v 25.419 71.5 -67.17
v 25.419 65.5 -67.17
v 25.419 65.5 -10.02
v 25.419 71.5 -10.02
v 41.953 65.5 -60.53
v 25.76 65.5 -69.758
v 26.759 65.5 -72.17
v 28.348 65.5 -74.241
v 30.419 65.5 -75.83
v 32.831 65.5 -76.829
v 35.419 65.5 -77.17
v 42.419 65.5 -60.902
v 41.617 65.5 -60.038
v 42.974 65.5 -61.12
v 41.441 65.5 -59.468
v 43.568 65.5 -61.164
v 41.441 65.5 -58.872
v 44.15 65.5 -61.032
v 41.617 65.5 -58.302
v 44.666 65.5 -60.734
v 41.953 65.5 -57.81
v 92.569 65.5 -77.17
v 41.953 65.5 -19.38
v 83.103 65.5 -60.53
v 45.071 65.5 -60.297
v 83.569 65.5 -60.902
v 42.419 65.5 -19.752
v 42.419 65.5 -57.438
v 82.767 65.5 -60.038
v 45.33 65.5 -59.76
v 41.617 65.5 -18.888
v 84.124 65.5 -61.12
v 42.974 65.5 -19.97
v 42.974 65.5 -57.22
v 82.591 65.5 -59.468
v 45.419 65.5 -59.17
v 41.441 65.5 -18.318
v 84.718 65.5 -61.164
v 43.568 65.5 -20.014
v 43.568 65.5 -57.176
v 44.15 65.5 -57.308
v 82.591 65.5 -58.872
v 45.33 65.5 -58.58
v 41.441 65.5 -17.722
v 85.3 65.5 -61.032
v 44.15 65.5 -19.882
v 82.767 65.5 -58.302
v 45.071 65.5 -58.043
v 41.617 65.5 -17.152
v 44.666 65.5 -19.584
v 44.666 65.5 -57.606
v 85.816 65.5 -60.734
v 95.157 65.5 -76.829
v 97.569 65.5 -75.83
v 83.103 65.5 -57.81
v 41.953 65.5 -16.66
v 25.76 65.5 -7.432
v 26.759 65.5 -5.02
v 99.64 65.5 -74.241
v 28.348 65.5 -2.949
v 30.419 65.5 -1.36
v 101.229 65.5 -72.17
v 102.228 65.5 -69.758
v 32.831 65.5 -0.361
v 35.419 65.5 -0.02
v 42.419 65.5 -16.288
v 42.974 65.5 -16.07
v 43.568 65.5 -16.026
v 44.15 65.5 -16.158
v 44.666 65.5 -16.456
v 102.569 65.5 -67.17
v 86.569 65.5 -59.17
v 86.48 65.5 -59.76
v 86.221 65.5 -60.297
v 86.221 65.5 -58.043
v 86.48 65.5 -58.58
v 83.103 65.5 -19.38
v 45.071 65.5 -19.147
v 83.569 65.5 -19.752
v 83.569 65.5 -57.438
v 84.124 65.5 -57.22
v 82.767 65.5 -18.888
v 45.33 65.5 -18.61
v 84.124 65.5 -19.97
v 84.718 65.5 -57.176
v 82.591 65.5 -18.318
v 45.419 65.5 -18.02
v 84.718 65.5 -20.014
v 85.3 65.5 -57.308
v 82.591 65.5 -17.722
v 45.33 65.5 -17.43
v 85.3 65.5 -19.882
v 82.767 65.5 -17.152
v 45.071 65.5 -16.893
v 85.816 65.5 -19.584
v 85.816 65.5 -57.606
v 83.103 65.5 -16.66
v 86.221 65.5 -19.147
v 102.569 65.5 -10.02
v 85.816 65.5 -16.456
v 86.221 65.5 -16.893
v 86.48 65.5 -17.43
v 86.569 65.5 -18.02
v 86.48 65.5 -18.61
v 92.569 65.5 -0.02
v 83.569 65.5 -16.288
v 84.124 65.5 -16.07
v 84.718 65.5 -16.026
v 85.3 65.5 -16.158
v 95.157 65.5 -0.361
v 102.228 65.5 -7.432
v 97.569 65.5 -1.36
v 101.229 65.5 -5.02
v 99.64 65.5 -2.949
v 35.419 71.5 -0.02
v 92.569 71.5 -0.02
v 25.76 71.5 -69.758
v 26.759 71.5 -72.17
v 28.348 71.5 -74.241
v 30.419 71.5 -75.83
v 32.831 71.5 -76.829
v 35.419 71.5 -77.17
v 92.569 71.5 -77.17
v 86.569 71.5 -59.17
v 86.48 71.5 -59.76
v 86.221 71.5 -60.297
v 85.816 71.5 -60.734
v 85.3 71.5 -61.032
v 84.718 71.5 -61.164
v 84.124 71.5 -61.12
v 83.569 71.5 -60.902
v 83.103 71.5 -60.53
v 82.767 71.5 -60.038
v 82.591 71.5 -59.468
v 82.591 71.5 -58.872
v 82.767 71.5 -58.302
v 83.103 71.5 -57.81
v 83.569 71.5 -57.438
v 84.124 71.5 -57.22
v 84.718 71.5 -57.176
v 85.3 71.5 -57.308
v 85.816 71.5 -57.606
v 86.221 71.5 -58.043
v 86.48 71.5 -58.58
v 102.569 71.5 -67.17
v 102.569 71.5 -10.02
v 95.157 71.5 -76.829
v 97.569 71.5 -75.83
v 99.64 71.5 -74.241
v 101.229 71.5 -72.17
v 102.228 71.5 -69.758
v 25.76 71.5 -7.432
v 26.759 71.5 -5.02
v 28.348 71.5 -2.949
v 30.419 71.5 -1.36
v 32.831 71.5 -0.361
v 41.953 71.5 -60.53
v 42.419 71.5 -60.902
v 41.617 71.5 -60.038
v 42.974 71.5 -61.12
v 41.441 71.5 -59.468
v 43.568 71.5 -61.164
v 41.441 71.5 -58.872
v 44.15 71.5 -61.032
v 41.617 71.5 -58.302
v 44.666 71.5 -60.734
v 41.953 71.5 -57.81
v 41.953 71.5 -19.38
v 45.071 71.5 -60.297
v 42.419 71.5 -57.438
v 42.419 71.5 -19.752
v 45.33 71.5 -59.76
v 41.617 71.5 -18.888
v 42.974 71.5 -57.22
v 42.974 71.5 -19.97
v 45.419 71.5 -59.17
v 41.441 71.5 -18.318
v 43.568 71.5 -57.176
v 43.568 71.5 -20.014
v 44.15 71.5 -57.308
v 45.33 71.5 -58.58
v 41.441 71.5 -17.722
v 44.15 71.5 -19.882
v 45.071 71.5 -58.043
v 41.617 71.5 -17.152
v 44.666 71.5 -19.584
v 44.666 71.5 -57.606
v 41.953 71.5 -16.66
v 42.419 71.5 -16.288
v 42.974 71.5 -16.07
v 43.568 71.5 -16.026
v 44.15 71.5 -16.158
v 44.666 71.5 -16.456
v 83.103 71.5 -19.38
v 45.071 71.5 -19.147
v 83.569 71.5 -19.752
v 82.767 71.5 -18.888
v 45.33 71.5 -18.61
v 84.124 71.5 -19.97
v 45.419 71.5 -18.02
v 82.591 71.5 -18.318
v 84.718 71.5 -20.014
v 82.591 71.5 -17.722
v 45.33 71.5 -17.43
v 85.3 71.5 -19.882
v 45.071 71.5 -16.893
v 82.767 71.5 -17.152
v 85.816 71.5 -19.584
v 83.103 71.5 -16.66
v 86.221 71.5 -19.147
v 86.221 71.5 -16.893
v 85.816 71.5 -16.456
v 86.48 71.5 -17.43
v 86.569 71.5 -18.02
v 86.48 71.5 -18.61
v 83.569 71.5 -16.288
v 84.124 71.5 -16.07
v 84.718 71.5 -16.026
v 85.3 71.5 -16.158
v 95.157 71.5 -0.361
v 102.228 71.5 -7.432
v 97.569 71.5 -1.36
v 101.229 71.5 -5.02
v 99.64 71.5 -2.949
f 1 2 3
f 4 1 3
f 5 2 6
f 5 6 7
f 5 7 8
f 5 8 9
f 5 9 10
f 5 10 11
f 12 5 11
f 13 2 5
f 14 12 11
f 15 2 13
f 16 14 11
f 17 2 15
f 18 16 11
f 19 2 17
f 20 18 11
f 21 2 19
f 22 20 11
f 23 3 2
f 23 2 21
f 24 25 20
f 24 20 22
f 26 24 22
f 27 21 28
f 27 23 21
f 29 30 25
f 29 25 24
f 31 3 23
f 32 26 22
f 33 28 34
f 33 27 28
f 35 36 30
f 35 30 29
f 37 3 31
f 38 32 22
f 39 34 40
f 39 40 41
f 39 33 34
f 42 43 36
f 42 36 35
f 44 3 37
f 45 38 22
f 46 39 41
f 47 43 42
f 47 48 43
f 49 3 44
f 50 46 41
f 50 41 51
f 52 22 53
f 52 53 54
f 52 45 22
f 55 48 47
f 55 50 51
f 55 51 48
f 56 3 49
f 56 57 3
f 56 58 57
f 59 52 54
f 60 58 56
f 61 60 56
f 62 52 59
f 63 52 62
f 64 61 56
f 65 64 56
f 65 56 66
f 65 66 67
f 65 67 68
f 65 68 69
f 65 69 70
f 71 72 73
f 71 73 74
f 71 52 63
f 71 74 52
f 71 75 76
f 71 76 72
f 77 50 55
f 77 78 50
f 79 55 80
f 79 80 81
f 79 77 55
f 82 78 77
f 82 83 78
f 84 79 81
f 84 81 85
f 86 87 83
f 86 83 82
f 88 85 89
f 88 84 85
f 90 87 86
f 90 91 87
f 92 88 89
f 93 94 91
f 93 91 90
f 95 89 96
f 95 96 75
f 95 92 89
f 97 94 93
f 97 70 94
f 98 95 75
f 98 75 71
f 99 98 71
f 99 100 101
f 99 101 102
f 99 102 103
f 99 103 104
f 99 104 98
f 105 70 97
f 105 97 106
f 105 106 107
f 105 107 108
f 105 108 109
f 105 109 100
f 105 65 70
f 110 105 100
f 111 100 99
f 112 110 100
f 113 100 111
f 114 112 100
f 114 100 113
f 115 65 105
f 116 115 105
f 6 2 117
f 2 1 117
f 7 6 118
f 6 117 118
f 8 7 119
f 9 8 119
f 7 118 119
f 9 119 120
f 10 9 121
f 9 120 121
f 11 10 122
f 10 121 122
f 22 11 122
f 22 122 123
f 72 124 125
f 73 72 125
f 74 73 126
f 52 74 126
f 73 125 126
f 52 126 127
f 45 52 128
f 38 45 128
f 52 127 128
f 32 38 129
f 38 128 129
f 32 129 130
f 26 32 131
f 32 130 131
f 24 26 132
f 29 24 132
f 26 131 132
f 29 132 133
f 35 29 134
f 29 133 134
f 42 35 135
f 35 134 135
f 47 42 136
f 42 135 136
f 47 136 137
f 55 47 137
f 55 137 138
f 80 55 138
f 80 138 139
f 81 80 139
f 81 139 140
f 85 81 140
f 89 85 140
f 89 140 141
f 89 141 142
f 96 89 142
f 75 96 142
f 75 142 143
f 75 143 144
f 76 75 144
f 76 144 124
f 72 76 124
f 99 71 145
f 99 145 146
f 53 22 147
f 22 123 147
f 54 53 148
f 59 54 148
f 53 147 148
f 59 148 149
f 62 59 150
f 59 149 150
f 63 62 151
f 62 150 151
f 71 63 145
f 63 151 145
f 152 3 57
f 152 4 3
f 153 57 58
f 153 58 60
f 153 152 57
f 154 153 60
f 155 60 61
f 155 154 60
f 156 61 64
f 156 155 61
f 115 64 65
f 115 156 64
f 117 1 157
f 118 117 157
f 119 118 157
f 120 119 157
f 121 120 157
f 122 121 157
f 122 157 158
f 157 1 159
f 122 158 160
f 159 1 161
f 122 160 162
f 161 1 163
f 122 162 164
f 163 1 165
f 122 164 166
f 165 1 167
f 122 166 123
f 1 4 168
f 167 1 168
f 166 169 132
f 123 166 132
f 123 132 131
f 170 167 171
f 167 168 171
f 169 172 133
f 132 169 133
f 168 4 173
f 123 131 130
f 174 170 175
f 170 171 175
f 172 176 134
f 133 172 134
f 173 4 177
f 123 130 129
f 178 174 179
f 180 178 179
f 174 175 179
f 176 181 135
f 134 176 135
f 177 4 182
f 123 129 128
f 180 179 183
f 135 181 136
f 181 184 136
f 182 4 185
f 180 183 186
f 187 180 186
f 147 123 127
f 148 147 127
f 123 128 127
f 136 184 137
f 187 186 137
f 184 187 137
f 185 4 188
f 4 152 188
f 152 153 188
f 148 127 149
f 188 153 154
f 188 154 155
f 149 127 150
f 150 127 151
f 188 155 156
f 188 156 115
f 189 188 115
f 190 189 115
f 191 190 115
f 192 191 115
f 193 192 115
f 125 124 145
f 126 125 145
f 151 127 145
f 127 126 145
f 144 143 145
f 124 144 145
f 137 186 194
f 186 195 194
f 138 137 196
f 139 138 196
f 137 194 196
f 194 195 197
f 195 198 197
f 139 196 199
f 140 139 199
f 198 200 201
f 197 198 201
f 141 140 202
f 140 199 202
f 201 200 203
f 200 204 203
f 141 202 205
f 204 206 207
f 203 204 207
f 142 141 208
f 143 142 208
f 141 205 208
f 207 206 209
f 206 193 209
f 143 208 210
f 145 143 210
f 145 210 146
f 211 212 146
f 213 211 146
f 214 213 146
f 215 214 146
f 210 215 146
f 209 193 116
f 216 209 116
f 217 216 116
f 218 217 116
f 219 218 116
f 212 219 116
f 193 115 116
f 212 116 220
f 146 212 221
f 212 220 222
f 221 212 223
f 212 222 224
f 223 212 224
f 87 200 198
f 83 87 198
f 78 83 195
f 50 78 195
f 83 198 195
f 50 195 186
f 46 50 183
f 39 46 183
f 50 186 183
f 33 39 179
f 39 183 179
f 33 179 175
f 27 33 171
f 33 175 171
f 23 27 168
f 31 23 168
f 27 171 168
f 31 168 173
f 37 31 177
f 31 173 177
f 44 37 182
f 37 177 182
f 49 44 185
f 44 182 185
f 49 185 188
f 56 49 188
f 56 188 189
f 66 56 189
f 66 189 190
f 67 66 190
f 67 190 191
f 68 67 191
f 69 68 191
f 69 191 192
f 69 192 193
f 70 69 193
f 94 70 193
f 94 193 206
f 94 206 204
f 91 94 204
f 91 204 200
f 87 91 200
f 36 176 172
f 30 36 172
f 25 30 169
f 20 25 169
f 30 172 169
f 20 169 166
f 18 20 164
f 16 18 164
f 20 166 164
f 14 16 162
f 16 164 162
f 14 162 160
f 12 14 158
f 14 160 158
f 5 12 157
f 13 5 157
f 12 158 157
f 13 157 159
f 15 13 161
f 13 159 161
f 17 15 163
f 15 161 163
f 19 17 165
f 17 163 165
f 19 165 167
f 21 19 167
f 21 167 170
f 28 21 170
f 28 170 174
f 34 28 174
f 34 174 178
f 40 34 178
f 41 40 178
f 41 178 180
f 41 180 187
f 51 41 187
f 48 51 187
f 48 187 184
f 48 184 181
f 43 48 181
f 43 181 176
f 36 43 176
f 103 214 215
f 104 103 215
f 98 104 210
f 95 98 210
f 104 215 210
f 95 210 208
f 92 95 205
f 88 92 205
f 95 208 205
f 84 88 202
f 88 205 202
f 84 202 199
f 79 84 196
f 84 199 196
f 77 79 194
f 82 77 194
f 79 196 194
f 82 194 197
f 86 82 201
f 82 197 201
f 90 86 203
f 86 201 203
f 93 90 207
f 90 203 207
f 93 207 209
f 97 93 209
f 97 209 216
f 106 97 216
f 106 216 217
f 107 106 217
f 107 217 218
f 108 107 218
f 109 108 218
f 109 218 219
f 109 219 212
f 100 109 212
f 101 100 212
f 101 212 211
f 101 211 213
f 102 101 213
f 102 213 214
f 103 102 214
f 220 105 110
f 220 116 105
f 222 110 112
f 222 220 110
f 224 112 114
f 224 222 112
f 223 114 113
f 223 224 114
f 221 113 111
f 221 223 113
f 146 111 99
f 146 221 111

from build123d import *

# Parameters (mm, degrees)
CROQUIS1_W              = 77.15
CROQUIS1_H              = 77.15
SALIENTE_EXTRUIR1_DEPTH = 6
CROQUIS2_R              = 2
CORTAR_EXTRUIR1_DEPTH   = 40
REDONDEO1_R             = 10


with BuildPart() as part:
    # Croquis1 → Saliente-Extruir1 (new body)
    with BuildSketch(Plane.XZ.offset(-65.5)):
        with Locations((63.993998695, -38.595)):
            Rectangle(CROQUIS1_W, CROQUIS1_H)
    extrude(amount=-SALIENTE_EXTRUIR1_DEPTH)

    # Croquis2 → Cortar-Extruir1 (cut)
    with BuildSketch(Plane(origin=(0, 71.5, 0), x_dir=(1, 0, 0), z_dir=(0, 1, 0))):
        with Locations((84.568998695, 59.17)):
            Circle(CROQUIS2_R)
        with Locations((84.568998695, 18.02)):
            Circle(CROQUIS2_R)
        with Locations((43.418998695, 18.02)):
            Circle(CROQUIS2_R)
        with Locations((43.418998695, 59.17)):
            Circle(CROQUIS2_R)
    extrude(amount=-CORTAR_EXTRUIR1_DEPTH, mode=Mode.SUBTRACT)

    # Redondeo1
    redondeo1_edges = [part.edges().sort_by_distance(p)[0] for p in [
        (25.418998695, 68.5, -0.02),
        (102.568998695, 68.5, -0.02),
        (102.568998695, 68.5, -77.17),
        (25.418998695, 68.5, -77.17),
    ]]
    fillet(redondeo1_edges, radius=REDONDEO1_R)


solid = part.part
